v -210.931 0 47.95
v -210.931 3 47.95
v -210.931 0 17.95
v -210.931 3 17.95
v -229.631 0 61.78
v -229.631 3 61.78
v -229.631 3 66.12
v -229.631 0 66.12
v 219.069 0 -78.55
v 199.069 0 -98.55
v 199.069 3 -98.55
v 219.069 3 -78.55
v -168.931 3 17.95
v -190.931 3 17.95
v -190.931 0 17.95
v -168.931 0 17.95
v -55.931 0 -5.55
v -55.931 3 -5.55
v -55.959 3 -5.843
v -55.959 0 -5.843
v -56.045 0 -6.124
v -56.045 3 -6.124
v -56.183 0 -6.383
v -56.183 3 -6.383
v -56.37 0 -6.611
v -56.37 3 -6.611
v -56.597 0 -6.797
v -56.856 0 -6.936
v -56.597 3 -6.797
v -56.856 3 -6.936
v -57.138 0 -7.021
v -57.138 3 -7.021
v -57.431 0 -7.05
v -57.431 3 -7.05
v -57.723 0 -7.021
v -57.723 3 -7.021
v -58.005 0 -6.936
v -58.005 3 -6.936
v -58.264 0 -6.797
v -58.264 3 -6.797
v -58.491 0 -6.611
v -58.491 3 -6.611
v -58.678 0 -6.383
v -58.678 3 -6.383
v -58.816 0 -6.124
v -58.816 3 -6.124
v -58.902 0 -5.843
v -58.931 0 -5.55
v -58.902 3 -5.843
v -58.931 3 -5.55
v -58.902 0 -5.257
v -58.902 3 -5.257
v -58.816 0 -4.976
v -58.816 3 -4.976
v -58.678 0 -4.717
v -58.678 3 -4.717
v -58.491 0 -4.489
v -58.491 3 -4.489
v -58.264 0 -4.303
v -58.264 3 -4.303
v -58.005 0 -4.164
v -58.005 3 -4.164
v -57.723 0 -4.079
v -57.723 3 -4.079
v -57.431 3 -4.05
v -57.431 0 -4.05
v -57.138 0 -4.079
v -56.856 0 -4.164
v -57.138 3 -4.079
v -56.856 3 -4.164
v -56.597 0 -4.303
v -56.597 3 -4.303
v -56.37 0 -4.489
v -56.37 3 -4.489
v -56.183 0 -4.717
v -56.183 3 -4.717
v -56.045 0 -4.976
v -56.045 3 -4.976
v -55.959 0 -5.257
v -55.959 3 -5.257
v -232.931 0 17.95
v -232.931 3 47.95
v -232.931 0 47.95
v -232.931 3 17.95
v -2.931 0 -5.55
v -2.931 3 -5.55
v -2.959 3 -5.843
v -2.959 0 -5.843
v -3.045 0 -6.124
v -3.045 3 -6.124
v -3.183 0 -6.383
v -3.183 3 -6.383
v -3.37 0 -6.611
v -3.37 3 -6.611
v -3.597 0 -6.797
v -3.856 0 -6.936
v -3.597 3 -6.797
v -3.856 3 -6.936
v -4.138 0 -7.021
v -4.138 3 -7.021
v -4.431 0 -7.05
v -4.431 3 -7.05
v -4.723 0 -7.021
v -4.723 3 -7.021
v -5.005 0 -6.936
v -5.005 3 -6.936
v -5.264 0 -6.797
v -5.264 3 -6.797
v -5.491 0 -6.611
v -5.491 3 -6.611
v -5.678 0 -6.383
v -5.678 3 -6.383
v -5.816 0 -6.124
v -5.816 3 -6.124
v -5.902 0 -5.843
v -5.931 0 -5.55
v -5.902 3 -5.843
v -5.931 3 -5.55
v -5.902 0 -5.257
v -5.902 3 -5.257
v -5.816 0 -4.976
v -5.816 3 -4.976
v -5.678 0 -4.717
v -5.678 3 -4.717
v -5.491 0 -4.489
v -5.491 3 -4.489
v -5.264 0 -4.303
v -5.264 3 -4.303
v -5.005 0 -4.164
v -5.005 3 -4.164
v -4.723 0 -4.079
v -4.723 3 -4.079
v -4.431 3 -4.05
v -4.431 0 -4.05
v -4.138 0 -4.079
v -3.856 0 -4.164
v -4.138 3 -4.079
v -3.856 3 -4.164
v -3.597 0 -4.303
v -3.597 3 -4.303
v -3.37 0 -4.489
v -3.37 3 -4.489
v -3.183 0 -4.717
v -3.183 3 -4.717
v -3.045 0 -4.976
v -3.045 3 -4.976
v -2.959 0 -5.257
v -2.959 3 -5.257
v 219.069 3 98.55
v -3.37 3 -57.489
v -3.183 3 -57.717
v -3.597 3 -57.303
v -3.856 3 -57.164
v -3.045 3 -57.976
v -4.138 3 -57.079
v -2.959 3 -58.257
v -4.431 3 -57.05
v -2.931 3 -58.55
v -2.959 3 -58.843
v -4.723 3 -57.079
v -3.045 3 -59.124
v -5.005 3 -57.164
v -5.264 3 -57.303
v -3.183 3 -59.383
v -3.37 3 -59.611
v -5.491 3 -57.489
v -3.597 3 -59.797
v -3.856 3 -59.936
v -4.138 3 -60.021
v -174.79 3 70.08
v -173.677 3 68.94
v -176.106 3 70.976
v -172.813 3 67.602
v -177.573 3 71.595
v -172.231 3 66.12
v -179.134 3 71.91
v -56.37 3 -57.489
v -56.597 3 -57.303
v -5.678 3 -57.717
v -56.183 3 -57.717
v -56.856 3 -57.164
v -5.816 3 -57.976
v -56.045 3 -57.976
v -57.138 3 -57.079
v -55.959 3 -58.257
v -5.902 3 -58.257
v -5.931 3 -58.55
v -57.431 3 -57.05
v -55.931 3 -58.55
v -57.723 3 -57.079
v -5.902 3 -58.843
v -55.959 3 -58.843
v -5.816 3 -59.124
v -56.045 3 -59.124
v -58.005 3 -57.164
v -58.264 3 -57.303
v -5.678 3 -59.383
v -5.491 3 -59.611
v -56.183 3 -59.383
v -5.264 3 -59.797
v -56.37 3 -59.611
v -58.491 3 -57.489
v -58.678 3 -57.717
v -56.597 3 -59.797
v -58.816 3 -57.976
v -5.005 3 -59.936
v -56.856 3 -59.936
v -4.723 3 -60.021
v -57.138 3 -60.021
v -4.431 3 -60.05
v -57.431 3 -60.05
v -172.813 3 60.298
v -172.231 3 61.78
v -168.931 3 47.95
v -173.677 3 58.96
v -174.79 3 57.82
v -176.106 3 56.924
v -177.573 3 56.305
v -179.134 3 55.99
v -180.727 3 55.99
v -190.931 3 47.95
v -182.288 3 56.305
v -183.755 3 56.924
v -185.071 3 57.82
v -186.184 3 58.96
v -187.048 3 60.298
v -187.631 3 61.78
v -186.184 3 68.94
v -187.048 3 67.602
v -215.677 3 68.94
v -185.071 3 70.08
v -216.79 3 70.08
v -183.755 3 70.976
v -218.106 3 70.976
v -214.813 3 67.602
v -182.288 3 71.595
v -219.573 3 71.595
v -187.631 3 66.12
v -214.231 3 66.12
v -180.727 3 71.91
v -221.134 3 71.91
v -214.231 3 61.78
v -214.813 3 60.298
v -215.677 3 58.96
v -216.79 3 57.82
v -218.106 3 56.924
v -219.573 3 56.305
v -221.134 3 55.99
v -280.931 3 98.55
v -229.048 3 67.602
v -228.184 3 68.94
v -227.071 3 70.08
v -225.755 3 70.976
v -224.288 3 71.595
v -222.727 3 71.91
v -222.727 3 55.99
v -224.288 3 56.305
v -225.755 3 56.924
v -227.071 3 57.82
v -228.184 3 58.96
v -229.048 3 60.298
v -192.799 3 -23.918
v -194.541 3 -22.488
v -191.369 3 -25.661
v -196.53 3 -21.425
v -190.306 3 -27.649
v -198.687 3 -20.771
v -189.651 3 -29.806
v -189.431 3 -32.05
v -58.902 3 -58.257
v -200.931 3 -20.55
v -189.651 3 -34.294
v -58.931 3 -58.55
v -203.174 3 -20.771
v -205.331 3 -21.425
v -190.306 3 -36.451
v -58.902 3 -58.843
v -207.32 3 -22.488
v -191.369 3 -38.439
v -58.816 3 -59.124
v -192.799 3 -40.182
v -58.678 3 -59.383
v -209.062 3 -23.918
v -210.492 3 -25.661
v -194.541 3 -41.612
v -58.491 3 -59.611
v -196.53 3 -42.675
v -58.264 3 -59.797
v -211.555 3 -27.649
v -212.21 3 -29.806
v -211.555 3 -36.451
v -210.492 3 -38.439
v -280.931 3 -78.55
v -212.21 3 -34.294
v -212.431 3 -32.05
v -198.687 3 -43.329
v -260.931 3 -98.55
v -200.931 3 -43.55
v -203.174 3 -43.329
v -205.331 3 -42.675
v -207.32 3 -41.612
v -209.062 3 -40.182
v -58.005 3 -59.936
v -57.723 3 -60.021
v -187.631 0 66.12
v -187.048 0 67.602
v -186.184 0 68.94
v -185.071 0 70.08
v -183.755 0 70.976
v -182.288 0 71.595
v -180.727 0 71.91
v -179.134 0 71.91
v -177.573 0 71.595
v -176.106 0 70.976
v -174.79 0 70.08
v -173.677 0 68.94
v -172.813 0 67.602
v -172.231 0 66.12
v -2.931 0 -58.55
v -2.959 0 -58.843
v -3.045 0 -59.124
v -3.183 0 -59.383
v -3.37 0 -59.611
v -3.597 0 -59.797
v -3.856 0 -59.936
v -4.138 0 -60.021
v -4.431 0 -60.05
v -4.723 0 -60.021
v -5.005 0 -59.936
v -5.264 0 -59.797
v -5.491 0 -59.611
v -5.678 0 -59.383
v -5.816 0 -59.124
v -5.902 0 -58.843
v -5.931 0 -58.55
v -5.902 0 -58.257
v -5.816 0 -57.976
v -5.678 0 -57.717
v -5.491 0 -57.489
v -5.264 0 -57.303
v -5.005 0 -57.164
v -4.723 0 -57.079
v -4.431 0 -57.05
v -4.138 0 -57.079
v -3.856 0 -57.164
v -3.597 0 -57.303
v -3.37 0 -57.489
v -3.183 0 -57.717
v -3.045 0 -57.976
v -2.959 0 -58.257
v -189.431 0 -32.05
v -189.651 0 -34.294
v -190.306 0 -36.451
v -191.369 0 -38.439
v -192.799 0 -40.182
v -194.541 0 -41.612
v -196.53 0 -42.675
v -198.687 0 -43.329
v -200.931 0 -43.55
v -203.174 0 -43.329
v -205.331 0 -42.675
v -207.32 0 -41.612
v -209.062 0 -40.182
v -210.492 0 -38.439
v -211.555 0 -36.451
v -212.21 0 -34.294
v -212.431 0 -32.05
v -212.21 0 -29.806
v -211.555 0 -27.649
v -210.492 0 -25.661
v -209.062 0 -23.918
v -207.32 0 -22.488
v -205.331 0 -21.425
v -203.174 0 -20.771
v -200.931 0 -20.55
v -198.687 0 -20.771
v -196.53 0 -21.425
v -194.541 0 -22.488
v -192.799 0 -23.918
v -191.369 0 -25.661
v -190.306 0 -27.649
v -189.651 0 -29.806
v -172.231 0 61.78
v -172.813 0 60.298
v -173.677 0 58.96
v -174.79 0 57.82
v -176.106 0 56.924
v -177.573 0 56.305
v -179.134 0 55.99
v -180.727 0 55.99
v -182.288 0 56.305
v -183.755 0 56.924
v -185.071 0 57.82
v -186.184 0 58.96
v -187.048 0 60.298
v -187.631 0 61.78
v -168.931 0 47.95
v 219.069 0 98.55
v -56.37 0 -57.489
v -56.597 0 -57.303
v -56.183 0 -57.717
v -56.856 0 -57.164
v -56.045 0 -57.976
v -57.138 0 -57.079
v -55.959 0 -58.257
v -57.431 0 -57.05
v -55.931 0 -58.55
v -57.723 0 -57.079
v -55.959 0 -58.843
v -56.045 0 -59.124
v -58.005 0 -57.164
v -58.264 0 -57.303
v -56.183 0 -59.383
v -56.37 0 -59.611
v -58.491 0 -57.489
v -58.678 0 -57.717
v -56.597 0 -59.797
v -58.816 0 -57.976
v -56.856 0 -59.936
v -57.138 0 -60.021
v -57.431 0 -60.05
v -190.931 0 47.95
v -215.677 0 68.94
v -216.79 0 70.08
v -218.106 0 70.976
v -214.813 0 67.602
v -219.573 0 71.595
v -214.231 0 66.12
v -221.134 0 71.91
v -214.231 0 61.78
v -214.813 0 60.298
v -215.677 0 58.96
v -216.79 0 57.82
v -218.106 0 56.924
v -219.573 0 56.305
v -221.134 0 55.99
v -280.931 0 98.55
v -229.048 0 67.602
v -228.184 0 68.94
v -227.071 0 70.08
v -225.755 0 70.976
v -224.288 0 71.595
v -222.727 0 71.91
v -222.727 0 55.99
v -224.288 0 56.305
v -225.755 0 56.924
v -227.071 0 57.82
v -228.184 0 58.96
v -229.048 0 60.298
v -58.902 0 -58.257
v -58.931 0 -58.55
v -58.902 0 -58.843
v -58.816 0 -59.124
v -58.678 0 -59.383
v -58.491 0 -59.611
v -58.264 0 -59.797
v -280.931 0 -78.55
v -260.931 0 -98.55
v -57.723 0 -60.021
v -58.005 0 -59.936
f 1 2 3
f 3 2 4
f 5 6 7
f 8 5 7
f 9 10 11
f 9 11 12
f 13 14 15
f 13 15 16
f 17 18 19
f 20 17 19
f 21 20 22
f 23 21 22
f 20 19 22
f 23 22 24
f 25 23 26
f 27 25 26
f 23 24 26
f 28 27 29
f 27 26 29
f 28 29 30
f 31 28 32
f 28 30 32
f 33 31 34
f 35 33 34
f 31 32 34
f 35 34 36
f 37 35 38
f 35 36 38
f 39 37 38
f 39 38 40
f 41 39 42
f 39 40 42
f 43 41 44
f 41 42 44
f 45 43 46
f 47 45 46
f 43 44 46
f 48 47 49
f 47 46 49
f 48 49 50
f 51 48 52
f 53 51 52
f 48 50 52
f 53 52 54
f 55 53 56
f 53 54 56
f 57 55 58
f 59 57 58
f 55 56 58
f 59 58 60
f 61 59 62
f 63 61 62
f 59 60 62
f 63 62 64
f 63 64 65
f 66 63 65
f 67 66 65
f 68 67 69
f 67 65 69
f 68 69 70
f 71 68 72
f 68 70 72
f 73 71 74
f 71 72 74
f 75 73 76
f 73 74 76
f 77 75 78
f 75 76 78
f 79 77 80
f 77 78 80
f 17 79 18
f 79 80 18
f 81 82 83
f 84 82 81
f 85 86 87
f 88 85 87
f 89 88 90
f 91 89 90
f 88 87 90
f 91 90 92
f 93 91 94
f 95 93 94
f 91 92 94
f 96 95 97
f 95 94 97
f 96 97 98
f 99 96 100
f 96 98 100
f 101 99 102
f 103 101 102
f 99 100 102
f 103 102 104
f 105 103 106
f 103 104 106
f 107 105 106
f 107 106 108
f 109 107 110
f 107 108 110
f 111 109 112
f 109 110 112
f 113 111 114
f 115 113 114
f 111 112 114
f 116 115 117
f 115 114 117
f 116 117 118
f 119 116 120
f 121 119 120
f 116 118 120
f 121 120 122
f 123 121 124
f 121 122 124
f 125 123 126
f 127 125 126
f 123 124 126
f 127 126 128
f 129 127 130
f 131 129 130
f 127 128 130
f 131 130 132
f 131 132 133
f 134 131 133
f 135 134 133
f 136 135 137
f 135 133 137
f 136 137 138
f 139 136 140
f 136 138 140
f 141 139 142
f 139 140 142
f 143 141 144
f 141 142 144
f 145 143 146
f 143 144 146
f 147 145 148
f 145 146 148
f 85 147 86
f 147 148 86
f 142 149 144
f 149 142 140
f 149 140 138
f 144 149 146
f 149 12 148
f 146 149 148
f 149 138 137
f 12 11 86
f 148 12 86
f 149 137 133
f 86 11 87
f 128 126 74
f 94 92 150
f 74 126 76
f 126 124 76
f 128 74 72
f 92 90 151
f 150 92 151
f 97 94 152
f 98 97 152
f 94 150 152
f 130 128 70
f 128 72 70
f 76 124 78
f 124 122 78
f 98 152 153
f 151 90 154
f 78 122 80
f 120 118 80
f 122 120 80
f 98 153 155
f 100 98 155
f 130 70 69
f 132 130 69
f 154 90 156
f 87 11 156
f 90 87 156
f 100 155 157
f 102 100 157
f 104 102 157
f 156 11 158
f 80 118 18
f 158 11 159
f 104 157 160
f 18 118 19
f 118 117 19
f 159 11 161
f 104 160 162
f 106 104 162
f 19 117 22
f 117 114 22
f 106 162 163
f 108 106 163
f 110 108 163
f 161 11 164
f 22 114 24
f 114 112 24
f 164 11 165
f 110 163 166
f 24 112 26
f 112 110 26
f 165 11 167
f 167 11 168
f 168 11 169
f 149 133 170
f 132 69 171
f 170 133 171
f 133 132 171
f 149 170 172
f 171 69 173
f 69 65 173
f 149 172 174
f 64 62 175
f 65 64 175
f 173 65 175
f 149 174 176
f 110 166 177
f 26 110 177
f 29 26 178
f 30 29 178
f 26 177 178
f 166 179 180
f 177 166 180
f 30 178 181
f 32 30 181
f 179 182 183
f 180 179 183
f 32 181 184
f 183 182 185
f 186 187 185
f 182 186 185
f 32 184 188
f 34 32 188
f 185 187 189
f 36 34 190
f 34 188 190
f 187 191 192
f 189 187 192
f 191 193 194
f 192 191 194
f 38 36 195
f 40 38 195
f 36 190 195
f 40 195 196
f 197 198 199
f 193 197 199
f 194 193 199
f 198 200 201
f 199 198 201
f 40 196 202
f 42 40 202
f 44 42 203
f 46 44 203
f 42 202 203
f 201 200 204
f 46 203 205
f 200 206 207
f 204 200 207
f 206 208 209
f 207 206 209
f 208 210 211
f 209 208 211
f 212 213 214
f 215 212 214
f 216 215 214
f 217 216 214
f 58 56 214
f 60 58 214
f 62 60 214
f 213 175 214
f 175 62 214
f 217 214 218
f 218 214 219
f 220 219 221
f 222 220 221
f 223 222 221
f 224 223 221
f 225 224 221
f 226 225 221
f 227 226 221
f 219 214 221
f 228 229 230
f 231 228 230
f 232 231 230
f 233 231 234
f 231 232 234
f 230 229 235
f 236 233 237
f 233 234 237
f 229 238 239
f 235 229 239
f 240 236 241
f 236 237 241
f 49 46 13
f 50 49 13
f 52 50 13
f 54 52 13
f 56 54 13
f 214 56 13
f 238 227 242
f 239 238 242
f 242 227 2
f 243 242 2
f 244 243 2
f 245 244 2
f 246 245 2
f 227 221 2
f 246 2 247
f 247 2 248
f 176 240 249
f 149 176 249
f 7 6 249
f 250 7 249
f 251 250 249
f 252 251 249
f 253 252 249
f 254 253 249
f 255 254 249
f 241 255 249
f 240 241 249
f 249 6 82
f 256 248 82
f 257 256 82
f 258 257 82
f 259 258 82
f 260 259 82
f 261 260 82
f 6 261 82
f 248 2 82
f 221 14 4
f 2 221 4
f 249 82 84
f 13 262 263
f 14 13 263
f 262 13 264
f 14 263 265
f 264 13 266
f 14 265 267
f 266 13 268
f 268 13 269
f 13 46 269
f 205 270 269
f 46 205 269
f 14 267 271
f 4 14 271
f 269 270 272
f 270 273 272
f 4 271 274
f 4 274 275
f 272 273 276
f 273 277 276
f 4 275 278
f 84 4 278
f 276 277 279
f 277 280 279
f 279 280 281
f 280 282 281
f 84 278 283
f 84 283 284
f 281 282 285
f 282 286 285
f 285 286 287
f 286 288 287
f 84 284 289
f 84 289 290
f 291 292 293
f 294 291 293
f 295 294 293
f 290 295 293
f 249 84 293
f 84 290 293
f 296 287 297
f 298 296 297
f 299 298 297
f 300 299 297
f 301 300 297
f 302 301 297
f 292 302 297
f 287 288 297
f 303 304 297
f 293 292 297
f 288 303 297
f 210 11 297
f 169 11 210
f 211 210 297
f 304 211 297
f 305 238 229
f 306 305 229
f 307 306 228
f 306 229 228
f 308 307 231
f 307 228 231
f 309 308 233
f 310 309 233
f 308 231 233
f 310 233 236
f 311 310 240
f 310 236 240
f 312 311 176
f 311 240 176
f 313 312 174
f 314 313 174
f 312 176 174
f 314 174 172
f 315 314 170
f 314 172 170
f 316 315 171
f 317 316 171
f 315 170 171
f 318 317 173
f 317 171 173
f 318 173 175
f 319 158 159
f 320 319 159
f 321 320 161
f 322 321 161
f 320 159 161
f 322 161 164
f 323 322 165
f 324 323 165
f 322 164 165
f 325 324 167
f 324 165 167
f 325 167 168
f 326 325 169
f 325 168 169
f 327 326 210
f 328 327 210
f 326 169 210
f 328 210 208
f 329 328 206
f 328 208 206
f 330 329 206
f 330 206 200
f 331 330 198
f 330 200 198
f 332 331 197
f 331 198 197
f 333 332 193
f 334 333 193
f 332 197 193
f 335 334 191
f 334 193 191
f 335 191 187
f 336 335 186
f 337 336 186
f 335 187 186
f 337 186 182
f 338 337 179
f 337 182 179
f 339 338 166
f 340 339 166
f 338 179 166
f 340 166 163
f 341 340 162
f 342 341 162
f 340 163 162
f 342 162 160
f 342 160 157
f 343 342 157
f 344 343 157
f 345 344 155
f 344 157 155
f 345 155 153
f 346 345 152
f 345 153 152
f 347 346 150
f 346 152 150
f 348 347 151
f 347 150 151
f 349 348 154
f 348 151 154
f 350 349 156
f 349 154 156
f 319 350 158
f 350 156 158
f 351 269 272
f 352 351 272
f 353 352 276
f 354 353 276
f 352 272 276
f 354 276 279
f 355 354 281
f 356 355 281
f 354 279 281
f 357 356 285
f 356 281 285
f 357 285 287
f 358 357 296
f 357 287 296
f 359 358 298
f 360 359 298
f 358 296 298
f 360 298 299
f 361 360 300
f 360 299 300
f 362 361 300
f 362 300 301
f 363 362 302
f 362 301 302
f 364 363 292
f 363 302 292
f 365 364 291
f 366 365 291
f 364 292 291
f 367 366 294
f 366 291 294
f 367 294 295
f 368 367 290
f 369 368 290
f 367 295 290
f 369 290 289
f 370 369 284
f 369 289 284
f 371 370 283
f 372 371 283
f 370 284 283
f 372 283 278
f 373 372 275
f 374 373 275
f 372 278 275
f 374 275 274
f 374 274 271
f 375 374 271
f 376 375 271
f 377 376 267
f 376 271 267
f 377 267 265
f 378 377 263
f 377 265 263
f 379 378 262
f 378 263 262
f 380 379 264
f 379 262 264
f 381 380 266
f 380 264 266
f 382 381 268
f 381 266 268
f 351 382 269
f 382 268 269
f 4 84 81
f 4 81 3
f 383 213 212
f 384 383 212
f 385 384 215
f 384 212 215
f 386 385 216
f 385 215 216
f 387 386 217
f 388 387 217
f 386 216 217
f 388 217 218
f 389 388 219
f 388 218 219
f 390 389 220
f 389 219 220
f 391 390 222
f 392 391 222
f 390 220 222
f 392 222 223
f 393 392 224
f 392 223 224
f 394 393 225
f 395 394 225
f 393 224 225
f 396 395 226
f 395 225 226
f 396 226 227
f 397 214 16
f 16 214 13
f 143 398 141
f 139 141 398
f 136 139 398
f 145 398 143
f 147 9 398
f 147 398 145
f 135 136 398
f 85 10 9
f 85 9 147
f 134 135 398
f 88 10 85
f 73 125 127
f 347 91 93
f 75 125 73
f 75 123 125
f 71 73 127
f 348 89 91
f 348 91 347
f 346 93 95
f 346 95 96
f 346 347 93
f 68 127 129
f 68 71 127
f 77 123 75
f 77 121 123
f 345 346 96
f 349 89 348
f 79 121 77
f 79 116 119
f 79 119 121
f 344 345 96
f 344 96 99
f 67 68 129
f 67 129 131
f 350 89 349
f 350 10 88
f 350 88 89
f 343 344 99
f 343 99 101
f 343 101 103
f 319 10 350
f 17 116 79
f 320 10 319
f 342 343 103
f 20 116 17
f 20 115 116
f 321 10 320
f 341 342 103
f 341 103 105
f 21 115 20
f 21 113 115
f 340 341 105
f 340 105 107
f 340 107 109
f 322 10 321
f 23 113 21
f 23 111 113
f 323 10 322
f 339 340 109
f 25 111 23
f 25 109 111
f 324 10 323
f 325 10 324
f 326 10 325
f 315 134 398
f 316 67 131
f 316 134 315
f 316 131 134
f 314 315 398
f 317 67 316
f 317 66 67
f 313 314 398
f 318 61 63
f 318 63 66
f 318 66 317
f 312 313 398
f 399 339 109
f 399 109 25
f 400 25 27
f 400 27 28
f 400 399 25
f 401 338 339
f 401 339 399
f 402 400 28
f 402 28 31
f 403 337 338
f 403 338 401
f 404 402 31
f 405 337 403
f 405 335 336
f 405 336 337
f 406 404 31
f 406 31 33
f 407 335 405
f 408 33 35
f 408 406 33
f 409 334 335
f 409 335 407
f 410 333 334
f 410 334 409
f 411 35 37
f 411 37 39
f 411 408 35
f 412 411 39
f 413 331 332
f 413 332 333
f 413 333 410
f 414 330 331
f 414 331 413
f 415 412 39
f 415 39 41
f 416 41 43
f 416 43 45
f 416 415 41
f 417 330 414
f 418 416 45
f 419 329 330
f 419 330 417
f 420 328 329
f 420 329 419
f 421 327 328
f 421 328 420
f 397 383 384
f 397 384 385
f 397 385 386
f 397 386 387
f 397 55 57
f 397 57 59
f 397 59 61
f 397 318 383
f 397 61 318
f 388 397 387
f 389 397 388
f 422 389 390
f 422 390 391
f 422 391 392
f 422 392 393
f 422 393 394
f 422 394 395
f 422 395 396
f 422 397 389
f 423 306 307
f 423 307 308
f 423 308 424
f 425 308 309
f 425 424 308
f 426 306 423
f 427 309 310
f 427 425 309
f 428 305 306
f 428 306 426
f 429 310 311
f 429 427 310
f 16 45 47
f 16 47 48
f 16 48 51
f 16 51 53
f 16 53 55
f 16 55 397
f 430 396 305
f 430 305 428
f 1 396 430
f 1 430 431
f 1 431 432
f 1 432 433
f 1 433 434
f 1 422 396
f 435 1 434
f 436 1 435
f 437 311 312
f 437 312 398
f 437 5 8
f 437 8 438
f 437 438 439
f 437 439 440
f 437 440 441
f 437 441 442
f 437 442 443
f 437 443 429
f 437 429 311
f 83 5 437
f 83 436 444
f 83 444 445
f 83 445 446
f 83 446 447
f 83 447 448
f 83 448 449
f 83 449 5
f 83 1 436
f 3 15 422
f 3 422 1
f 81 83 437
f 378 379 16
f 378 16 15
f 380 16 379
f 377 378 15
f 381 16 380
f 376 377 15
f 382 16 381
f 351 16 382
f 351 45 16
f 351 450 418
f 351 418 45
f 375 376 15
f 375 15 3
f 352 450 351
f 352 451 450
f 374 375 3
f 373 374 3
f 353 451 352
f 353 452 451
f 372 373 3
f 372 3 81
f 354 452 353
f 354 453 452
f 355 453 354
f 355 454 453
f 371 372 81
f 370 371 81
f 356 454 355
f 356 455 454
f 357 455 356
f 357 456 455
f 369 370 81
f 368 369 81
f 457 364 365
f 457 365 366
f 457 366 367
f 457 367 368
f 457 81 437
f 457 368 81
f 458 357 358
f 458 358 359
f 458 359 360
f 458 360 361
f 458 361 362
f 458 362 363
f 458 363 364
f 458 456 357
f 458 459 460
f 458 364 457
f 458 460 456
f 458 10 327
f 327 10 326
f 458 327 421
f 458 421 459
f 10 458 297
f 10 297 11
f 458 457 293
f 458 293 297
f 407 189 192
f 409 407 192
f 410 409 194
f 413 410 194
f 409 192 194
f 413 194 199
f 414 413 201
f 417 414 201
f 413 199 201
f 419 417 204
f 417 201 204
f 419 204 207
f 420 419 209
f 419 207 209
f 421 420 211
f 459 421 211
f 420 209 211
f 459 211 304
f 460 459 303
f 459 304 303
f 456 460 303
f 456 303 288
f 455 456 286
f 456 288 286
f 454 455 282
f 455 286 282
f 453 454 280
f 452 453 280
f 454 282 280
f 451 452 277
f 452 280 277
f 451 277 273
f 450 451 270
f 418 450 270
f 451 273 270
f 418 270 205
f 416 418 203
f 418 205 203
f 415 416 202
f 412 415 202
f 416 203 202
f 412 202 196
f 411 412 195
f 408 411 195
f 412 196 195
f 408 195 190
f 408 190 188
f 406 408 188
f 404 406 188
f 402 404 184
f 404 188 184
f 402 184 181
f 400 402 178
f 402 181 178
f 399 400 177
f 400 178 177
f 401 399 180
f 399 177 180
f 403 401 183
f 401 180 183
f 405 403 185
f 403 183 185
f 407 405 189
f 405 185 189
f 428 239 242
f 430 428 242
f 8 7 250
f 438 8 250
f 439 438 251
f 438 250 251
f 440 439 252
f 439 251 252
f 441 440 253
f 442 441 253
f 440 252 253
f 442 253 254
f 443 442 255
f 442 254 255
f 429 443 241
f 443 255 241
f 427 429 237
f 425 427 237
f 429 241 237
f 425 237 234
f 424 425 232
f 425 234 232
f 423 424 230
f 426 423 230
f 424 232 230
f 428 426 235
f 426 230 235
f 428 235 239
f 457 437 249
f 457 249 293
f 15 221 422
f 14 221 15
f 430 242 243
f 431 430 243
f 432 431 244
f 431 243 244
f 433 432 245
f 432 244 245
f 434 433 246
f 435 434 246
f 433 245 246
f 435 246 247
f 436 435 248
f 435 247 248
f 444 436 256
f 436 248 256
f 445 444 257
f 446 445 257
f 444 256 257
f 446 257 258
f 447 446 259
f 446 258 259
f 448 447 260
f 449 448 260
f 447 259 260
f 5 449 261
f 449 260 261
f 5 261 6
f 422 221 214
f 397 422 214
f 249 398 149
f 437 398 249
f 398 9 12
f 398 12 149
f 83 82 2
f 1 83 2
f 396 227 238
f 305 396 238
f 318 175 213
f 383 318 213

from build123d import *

# Parameters (mm, degrees)
BOSS_EXTRUDE1_DEPTH = 3
SKETCH2_R           = 1.5
CUT_EXTRUDE1_DEPTH  = 3
SKETCH3_R           = 11.5
SKETCH3_W           = 22
SKETCH3_H           = 30
CUT_EXTRUDE2_DEPTH  = 3
CUT_EXTRUDE3_DEPTH  = 3


with BuildPart() as part:
    # Sketch1 → Boss-Extrude1 (new body)
    with BuildSketch(Plane(origin=(0, 0, 0), x_dir=(1, 0, 0), z_dir=(0, 1, 0))):
        Polygon((219.069498766, 78.55), (219.069498766, -98.55), (-280.930501234, -98.55), (-280.930501234, 78.55), (-260.930501234, 98.55), (199.069498766, 98.55), align=None)
    extrude(amount=BOSS_EXTRUDE1_DEPTH)

    # Sketch2 → Cut-Extrude1 (cut)
    with BuildSketch(Plane(origin=(0, 3, 0), x_dir=(1, 0, 0), z_dir=(0, 1, 0))):
        with Locations((-4.430501234, 5.55)):
            Circle(SKETCH2_R)
        with Locations((-57.430501234, 5.55)):
            Circle(SKETCH2_R)
        with Locations((-57.430501234, 58.55)):
            Circle(SKETCH2_R)
        with Locations((-4.430501234, 58.55)):
            Circle(SKETCH2_R)
    extrude(amount=-CUT_EXTRUDE1_DEPTH, mode=Mode.SUBTRACT)

    # Sketch3 → Cut-Extrude2 (cut)
    with BuildSketch(Plane(origin=(0, 3, 0), x_dir=(1, 0, 0), z_dir=(0, 1, 0))):
        with Locations((-200.930501234, 32.05)):
            Circle(SKETCH3_R)
        with Locations((-221.930501234, -32.95)):
            Rectangle(SKETCH3_W, SKETCH3_H)
        with Locations((-179.930501234, -32.95)):
            Rectangle(SKETCH3_W, SKETCH3_H)
    extrude(amount=-CUT_EXTRUDE2_DEPTH, mode=Mode.SUBTRACT)

    # Sketch4 → Cut-Extrude3 (cut)
    with BuildSketch(Plane(origin=(0, 3, 0), x_dir=(1, 0, 0), z_dir=(0, 1, 0))):
        with BuildLine():
            Line((-187.630501234, -61.779746559), (-187.630501234, -66.120253441))
            ThreePointArc((-187.630501234, -66.120253441), (-179.930501234, -71.95), (-172.230501234, -66.120253441))
            Line((-172.230501234, -66.120253441), (-172.230501234, -61.779746559))
            ThreePointArc((-172.230501234, -61.779746559), (-179.930501234, -55.95), (-187.630501234, -61.779746559))
        make_face()
        with BuildLine():
            Line((-229.630501234, -61.779746559), (-229.630501234, -66.120253441))
            ThreePointArc((-229.630501234, -66.120253441), (-221.930501234, -71.95), (-214.230501234, -66.120253441))
            Line((-214.230501234, -66.120253441), (-214.230501234, -61.779746559))
            ThreePointArc((-214.230501234, -61.779746559), (-221.930501234, -55.95), (-229.630501234, -61.779746559))
        make_face()
    extrude(amount=-CUT_EXTRUDE3_DEPTH, mode=Mode.SUBTRACT)


solid = part.part
